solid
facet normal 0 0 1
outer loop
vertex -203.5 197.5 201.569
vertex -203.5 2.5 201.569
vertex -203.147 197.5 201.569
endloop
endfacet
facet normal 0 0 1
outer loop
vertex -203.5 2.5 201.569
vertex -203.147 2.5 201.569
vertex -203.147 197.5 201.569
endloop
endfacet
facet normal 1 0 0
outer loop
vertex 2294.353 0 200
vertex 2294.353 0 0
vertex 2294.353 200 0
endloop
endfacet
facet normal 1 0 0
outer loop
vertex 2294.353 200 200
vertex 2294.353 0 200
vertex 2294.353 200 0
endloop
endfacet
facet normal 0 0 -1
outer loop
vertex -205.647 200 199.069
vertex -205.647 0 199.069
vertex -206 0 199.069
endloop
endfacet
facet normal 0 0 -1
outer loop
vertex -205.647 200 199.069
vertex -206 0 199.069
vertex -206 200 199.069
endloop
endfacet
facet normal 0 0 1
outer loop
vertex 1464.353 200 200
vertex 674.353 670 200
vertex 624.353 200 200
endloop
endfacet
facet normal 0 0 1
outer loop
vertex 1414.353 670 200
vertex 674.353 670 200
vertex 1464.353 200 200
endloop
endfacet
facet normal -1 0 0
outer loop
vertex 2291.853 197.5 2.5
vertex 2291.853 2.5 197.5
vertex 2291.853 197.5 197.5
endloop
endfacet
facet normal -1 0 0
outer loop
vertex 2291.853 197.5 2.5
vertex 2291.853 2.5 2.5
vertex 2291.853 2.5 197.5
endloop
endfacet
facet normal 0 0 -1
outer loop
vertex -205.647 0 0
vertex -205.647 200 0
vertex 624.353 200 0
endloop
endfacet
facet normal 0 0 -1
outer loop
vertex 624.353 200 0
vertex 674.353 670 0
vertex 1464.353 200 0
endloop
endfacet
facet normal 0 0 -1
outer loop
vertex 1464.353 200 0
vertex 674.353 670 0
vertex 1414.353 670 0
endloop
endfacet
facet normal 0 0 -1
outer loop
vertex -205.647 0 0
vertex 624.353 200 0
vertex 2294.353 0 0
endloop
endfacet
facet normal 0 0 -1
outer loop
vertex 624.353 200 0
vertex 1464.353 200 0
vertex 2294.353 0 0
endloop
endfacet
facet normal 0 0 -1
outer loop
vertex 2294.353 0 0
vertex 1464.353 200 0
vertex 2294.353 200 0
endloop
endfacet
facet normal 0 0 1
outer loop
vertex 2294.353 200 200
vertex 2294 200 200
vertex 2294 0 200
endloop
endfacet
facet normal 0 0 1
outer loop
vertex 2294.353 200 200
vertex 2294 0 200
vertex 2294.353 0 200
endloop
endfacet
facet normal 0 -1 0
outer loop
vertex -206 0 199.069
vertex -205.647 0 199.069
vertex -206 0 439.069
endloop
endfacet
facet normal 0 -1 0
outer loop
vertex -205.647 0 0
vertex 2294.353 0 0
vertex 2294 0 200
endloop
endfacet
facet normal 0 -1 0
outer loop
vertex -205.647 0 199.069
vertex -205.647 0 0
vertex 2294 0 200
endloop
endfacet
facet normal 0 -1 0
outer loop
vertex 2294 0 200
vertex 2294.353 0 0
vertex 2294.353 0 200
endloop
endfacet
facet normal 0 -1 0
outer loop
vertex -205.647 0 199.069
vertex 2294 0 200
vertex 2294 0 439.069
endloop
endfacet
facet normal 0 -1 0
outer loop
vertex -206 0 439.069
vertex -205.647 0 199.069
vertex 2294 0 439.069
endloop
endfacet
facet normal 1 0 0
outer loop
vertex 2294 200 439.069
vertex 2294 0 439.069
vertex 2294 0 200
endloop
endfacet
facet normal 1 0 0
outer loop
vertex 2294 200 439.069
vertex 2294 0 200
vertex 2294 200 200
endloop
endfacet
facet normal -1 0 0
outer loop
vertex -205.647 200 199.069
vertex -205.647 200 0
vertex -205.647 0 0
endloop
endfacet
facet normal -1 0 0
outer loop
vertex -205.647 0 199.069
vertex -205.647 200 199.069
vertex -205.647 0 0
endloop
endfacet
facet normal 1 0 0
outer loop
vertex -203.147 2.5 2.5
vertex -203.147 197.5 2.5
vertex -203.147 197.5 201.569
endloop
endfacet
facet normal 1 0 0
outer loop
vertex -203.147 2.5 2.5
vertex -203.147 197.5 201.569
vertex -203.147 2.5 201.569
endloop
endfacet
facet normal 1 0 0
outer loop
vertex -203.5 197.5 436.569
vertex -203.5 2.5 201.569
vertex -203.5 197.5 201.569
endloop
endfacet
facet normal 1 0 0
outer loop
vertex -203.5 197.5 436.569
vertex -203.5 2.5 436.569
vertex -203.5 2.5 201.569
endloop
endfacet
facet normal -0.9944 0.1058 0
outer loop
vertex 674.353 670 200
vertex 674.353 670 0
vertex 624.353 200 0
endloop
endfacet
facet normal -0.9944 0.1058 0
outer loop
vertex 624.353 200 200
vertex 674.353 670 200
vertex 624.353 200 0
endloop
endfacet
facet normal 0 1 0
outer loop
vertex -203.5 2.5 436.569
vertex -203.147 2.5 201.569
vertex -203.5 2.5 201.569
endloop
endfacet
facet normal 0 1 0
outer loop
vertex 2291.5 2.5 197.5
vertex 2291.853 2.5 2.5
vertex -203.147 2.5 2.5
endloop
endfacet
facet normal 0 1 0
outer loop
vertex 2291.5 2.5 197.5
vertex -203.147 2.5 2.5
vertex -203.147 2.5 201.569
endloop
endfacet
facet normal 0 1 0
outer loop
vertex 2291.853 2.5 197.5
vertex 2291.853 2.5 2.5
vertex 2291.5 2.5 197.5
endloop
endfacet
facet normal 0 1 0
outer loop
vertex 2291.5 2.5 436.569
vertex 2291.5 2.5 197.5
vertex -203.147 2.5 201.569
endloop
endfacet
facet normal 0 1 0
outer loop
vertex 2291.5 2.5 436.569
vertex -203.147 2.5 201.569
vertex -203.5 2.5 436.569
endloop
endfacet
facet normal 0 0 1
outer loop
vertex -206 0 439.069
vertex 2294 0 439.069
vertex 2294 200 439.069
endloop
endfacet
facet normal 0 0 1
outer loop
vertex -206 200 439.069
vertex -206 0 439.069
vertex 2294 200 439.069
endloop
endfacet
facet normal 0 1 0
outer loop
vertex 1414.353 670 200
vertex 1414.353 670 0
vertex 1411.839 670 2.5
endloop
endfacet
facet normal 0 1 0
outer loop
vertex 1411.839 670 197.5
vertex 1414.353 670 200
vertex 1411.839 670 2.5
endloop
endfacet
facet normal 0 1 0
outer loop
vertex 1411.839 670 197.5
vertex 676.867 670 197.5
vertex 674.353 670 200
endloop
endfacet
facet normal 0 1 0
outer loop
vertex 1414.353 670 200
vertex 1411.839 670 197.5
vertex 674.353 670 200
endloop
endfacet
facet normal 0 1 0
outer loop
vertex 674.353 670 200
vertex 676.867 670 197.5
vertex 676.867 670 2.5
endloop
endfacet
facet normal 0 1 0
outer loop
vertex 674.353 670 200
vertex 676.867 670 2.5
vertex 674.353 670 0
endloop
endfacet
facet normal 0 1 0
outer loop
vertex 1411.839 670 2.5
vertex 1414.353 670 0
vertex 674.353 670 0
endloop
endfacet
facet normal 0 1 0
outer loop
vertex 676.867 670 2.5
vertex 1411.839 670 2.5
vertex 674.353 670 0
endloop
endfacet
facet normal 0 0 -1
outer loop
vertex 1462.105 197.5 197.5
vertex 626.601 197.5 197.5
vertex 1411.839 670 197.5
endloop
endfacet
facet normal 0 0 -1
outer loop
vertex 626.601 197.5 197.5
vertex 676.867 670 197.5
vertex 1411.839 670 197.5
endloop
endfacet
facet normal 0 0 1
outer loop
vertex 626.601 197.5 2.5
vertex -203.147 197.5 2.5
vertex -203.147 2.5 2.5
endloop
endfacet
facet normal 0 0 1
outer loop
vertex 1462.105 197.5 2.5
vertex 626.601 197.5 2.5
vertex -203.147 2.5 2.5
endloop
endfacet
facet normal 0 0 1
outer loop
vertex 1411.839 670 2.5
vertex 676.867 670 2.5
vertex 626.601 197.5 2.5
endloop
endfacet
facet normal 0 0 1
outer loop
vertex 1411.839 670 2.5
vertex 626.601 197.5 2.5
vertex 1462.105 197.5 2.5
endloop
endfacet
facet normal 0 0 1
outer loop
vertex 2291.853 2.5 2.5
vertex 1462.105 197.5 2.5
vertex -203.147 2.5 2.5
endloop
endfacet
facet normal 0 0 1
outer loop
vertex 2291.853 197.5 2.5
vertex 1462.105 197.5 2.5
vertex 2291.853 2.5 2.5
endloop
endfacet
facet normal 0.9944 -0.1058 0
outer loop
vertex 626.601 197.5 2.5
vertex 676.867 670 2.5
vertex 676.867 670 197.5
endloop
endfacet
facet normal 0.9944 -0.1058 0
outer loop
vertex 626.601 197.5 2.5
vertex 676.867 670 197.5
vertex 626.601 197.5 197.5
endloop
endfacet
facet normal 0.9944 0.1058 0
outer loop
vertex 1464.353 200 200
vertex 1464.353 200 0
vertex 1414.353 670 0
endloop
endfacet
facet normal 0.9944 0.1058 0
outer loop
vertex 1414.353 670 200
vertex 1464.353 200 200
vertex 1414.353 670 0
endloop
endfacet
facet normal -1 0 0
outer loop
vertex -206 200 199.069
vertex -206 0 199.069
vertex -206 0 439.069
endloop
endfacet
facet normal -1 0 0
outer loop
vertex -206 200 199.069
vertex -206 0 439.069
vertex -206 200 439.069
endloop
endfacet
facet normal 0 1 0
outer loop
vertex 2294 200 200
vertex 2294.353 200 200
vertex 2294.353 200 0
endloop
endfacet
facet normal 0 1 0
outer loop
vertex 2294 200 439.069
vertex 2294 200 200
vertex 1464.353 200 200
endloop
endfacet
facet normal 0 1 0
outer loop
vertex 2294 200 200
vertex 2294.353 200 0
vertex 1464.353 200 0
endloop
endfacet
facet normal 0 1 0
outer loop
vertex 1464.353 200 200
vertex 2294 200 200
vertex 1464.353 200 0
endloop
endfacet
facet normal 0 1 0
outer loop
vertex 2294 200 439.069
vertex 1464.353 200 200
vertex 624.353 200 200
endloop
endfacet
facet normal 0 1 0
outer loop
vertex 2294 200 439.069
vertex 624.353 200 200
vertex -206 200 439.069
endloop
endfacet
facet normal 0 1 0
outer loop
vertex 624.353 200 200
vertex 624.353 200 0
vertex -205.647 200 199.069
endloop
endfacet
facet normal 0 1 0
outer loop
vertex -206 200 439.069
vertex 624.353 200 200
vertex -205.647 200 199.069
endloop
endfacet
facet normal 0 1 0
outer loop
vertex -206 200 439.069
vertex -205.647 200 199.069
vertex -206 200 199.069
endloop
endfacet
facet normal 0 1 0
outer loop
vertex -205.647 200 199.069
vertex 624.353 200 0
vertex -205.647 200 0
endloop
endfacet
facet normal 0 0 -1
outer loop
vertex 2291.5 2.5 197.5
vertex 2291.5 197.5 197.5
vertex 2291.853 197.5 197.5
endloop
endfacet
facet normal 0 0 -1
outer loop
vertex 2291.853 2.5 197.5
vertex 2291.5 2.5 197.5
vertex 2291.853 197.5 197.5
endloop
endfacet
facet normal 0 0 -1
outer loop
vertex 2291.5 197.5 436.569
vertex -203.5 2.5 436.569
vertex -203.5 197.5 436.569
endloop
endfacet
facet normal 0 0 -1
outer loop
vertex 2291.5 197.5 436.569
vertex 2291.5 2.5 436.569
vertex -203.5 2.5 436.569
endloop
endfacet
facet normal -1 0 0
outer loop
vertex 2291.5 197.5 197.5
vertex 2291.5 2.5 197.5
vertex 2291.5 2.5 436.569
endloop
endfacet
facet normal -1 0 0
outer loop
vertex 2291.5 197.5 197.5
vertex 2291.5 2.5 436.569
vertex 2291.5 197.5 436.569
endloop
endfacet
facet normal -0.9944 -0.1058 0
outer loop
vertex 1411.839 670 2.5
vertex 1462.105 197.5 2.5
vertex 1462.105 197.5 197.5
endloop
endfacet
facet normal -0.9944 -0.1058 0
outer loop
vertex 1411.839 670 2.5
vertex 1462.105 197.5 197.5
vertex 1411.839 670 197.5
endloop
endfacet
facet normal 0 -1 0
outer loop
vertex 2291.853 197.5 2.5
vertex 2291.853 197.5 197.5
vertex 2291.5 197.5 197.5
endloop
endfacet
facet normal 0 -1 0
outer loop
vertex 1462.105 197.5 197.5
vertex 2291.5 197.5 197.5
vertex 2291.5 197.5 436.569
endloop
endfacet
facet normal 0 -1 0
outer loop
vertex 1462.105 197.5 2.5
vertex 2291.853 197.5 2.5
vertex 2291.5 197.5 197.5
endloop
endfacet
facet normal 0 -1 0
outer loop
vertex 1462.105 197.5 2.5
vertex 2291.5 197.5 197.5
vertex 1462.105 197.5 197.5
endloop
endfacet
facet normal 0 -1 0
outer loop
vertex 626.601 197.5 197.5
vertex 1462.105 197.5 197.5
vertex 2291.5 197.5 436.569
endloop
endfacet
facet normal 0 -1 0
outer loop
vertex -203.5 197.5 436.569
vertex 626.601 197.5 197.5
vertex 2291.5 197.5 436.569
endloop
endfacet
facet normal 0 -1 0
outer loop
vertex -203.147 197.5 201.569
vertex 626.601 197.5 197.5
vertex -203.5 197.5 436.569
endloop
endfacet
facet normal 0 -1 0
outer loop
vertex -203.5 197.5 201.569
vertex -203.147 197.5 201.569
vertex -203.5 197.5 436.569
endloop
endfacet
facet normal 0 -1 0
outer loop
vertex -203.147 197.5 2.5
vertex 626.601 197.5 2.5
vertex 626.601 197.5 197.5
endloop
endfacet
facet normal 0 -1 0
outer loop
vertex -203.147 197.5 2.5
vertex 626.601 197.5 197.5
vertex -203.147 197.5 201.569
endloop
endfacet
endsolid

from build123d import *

# Parameters (mm, degrees)
F1_DEPTH      = 200
F2_W          = 200
F2_H          = 240
F3_DEPTH      = 2294
F3_DEPTH_BACK = 206
F4_T          = -2.5


with BuildPart() as f1:
    # F0 (on Top) → F1 (new body)
    with BuildSketch(Plane.XY):
        Polygon((-205.6466794014, 200), (-205.6466794014, 0), (2294.3533205986, 0), (2294.3533205986, 200), (1464.3533205986, 200), (1044.3533205986, 200), (624.3533205986, 200), align=None)
        Polygon((674.3533205986, 670), (624.3533205986, 200), (1044.3533205986, 200), (1044.3533205986, 670), align=None)
        Polygon((1044.3533205986, 200), (1464.3533205986, 200), (1414.3533205986, 670), (1044.3533205986, 670), align=None)
    extrude(amount=F1_DEPTH)

    # F2 (on Right) → F3 (join, two sides)
    with BuildSketch(Plane.YZ) as f3_sk:
        with Locations((100, 319.0685760975)):
            Rectangle(F2_W, F2_H)
    extrude(amount=F3_DEPTH)
    extrude(f3_sk.sketch, amount=-F3_DEPTH_BACK)

    # F4
    f4_openings = [f1.faces().sort_by_distance(p)[0] for p in [
        (1044.353321, 670, 100),
    ]]
    offset(amount=F4_T, openings=f4_openings, kind=Kind.INTERSECTION)


solid = f1.part
